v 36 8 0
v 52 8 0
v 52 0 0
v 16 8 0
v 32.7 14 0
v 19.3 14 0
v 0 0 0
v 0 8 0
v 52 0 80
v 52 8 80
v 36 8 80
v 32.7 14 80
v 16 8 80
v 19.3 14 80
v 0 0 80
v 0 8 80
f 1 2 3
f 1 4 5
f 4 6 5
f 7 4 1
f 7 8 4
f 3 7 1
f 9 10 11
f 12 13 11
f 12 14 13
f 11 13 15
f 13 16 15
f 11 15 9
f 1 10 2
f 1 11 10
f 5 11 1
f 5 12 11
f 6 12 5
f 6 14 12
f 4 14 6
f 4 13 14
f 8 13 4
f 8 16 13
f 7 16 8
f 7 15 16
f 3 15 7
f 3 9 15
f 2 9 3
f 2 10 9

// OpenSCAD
$fn = 32;

// ----------------------------------------------------------------------
// V guide rail: dovetail, 52 mm wide
// ----------------------------------------------------------------------

// --- parameters (mm) ---
rail_w = 52;              // rail width, X
base_t = 8;               // base plate thickness
v_depth = 6;              // V feature depth / height
v_half_w = 10;            // half width of the V at the base face
plate_t = 80;             // rail length, Z (the extrusion height)
top_half_w = 6.7;         // half width at the dovetail top

dovetail_base = 2 * v_half_w;  // dovetail width at the base
dovetail_top = 2 * top_half_w;  // dovetail width at the top

profile = [[0, 0], [52, 0], [52, 8], [36, 8], [32.7, 14], [19.3, 14], [16, 8], [0, 8]];  // primary outline, 8 points, counter clockwise

// --- the one profile operation ---
linear_extrude(height = plate_t) polygon(points = profile);
